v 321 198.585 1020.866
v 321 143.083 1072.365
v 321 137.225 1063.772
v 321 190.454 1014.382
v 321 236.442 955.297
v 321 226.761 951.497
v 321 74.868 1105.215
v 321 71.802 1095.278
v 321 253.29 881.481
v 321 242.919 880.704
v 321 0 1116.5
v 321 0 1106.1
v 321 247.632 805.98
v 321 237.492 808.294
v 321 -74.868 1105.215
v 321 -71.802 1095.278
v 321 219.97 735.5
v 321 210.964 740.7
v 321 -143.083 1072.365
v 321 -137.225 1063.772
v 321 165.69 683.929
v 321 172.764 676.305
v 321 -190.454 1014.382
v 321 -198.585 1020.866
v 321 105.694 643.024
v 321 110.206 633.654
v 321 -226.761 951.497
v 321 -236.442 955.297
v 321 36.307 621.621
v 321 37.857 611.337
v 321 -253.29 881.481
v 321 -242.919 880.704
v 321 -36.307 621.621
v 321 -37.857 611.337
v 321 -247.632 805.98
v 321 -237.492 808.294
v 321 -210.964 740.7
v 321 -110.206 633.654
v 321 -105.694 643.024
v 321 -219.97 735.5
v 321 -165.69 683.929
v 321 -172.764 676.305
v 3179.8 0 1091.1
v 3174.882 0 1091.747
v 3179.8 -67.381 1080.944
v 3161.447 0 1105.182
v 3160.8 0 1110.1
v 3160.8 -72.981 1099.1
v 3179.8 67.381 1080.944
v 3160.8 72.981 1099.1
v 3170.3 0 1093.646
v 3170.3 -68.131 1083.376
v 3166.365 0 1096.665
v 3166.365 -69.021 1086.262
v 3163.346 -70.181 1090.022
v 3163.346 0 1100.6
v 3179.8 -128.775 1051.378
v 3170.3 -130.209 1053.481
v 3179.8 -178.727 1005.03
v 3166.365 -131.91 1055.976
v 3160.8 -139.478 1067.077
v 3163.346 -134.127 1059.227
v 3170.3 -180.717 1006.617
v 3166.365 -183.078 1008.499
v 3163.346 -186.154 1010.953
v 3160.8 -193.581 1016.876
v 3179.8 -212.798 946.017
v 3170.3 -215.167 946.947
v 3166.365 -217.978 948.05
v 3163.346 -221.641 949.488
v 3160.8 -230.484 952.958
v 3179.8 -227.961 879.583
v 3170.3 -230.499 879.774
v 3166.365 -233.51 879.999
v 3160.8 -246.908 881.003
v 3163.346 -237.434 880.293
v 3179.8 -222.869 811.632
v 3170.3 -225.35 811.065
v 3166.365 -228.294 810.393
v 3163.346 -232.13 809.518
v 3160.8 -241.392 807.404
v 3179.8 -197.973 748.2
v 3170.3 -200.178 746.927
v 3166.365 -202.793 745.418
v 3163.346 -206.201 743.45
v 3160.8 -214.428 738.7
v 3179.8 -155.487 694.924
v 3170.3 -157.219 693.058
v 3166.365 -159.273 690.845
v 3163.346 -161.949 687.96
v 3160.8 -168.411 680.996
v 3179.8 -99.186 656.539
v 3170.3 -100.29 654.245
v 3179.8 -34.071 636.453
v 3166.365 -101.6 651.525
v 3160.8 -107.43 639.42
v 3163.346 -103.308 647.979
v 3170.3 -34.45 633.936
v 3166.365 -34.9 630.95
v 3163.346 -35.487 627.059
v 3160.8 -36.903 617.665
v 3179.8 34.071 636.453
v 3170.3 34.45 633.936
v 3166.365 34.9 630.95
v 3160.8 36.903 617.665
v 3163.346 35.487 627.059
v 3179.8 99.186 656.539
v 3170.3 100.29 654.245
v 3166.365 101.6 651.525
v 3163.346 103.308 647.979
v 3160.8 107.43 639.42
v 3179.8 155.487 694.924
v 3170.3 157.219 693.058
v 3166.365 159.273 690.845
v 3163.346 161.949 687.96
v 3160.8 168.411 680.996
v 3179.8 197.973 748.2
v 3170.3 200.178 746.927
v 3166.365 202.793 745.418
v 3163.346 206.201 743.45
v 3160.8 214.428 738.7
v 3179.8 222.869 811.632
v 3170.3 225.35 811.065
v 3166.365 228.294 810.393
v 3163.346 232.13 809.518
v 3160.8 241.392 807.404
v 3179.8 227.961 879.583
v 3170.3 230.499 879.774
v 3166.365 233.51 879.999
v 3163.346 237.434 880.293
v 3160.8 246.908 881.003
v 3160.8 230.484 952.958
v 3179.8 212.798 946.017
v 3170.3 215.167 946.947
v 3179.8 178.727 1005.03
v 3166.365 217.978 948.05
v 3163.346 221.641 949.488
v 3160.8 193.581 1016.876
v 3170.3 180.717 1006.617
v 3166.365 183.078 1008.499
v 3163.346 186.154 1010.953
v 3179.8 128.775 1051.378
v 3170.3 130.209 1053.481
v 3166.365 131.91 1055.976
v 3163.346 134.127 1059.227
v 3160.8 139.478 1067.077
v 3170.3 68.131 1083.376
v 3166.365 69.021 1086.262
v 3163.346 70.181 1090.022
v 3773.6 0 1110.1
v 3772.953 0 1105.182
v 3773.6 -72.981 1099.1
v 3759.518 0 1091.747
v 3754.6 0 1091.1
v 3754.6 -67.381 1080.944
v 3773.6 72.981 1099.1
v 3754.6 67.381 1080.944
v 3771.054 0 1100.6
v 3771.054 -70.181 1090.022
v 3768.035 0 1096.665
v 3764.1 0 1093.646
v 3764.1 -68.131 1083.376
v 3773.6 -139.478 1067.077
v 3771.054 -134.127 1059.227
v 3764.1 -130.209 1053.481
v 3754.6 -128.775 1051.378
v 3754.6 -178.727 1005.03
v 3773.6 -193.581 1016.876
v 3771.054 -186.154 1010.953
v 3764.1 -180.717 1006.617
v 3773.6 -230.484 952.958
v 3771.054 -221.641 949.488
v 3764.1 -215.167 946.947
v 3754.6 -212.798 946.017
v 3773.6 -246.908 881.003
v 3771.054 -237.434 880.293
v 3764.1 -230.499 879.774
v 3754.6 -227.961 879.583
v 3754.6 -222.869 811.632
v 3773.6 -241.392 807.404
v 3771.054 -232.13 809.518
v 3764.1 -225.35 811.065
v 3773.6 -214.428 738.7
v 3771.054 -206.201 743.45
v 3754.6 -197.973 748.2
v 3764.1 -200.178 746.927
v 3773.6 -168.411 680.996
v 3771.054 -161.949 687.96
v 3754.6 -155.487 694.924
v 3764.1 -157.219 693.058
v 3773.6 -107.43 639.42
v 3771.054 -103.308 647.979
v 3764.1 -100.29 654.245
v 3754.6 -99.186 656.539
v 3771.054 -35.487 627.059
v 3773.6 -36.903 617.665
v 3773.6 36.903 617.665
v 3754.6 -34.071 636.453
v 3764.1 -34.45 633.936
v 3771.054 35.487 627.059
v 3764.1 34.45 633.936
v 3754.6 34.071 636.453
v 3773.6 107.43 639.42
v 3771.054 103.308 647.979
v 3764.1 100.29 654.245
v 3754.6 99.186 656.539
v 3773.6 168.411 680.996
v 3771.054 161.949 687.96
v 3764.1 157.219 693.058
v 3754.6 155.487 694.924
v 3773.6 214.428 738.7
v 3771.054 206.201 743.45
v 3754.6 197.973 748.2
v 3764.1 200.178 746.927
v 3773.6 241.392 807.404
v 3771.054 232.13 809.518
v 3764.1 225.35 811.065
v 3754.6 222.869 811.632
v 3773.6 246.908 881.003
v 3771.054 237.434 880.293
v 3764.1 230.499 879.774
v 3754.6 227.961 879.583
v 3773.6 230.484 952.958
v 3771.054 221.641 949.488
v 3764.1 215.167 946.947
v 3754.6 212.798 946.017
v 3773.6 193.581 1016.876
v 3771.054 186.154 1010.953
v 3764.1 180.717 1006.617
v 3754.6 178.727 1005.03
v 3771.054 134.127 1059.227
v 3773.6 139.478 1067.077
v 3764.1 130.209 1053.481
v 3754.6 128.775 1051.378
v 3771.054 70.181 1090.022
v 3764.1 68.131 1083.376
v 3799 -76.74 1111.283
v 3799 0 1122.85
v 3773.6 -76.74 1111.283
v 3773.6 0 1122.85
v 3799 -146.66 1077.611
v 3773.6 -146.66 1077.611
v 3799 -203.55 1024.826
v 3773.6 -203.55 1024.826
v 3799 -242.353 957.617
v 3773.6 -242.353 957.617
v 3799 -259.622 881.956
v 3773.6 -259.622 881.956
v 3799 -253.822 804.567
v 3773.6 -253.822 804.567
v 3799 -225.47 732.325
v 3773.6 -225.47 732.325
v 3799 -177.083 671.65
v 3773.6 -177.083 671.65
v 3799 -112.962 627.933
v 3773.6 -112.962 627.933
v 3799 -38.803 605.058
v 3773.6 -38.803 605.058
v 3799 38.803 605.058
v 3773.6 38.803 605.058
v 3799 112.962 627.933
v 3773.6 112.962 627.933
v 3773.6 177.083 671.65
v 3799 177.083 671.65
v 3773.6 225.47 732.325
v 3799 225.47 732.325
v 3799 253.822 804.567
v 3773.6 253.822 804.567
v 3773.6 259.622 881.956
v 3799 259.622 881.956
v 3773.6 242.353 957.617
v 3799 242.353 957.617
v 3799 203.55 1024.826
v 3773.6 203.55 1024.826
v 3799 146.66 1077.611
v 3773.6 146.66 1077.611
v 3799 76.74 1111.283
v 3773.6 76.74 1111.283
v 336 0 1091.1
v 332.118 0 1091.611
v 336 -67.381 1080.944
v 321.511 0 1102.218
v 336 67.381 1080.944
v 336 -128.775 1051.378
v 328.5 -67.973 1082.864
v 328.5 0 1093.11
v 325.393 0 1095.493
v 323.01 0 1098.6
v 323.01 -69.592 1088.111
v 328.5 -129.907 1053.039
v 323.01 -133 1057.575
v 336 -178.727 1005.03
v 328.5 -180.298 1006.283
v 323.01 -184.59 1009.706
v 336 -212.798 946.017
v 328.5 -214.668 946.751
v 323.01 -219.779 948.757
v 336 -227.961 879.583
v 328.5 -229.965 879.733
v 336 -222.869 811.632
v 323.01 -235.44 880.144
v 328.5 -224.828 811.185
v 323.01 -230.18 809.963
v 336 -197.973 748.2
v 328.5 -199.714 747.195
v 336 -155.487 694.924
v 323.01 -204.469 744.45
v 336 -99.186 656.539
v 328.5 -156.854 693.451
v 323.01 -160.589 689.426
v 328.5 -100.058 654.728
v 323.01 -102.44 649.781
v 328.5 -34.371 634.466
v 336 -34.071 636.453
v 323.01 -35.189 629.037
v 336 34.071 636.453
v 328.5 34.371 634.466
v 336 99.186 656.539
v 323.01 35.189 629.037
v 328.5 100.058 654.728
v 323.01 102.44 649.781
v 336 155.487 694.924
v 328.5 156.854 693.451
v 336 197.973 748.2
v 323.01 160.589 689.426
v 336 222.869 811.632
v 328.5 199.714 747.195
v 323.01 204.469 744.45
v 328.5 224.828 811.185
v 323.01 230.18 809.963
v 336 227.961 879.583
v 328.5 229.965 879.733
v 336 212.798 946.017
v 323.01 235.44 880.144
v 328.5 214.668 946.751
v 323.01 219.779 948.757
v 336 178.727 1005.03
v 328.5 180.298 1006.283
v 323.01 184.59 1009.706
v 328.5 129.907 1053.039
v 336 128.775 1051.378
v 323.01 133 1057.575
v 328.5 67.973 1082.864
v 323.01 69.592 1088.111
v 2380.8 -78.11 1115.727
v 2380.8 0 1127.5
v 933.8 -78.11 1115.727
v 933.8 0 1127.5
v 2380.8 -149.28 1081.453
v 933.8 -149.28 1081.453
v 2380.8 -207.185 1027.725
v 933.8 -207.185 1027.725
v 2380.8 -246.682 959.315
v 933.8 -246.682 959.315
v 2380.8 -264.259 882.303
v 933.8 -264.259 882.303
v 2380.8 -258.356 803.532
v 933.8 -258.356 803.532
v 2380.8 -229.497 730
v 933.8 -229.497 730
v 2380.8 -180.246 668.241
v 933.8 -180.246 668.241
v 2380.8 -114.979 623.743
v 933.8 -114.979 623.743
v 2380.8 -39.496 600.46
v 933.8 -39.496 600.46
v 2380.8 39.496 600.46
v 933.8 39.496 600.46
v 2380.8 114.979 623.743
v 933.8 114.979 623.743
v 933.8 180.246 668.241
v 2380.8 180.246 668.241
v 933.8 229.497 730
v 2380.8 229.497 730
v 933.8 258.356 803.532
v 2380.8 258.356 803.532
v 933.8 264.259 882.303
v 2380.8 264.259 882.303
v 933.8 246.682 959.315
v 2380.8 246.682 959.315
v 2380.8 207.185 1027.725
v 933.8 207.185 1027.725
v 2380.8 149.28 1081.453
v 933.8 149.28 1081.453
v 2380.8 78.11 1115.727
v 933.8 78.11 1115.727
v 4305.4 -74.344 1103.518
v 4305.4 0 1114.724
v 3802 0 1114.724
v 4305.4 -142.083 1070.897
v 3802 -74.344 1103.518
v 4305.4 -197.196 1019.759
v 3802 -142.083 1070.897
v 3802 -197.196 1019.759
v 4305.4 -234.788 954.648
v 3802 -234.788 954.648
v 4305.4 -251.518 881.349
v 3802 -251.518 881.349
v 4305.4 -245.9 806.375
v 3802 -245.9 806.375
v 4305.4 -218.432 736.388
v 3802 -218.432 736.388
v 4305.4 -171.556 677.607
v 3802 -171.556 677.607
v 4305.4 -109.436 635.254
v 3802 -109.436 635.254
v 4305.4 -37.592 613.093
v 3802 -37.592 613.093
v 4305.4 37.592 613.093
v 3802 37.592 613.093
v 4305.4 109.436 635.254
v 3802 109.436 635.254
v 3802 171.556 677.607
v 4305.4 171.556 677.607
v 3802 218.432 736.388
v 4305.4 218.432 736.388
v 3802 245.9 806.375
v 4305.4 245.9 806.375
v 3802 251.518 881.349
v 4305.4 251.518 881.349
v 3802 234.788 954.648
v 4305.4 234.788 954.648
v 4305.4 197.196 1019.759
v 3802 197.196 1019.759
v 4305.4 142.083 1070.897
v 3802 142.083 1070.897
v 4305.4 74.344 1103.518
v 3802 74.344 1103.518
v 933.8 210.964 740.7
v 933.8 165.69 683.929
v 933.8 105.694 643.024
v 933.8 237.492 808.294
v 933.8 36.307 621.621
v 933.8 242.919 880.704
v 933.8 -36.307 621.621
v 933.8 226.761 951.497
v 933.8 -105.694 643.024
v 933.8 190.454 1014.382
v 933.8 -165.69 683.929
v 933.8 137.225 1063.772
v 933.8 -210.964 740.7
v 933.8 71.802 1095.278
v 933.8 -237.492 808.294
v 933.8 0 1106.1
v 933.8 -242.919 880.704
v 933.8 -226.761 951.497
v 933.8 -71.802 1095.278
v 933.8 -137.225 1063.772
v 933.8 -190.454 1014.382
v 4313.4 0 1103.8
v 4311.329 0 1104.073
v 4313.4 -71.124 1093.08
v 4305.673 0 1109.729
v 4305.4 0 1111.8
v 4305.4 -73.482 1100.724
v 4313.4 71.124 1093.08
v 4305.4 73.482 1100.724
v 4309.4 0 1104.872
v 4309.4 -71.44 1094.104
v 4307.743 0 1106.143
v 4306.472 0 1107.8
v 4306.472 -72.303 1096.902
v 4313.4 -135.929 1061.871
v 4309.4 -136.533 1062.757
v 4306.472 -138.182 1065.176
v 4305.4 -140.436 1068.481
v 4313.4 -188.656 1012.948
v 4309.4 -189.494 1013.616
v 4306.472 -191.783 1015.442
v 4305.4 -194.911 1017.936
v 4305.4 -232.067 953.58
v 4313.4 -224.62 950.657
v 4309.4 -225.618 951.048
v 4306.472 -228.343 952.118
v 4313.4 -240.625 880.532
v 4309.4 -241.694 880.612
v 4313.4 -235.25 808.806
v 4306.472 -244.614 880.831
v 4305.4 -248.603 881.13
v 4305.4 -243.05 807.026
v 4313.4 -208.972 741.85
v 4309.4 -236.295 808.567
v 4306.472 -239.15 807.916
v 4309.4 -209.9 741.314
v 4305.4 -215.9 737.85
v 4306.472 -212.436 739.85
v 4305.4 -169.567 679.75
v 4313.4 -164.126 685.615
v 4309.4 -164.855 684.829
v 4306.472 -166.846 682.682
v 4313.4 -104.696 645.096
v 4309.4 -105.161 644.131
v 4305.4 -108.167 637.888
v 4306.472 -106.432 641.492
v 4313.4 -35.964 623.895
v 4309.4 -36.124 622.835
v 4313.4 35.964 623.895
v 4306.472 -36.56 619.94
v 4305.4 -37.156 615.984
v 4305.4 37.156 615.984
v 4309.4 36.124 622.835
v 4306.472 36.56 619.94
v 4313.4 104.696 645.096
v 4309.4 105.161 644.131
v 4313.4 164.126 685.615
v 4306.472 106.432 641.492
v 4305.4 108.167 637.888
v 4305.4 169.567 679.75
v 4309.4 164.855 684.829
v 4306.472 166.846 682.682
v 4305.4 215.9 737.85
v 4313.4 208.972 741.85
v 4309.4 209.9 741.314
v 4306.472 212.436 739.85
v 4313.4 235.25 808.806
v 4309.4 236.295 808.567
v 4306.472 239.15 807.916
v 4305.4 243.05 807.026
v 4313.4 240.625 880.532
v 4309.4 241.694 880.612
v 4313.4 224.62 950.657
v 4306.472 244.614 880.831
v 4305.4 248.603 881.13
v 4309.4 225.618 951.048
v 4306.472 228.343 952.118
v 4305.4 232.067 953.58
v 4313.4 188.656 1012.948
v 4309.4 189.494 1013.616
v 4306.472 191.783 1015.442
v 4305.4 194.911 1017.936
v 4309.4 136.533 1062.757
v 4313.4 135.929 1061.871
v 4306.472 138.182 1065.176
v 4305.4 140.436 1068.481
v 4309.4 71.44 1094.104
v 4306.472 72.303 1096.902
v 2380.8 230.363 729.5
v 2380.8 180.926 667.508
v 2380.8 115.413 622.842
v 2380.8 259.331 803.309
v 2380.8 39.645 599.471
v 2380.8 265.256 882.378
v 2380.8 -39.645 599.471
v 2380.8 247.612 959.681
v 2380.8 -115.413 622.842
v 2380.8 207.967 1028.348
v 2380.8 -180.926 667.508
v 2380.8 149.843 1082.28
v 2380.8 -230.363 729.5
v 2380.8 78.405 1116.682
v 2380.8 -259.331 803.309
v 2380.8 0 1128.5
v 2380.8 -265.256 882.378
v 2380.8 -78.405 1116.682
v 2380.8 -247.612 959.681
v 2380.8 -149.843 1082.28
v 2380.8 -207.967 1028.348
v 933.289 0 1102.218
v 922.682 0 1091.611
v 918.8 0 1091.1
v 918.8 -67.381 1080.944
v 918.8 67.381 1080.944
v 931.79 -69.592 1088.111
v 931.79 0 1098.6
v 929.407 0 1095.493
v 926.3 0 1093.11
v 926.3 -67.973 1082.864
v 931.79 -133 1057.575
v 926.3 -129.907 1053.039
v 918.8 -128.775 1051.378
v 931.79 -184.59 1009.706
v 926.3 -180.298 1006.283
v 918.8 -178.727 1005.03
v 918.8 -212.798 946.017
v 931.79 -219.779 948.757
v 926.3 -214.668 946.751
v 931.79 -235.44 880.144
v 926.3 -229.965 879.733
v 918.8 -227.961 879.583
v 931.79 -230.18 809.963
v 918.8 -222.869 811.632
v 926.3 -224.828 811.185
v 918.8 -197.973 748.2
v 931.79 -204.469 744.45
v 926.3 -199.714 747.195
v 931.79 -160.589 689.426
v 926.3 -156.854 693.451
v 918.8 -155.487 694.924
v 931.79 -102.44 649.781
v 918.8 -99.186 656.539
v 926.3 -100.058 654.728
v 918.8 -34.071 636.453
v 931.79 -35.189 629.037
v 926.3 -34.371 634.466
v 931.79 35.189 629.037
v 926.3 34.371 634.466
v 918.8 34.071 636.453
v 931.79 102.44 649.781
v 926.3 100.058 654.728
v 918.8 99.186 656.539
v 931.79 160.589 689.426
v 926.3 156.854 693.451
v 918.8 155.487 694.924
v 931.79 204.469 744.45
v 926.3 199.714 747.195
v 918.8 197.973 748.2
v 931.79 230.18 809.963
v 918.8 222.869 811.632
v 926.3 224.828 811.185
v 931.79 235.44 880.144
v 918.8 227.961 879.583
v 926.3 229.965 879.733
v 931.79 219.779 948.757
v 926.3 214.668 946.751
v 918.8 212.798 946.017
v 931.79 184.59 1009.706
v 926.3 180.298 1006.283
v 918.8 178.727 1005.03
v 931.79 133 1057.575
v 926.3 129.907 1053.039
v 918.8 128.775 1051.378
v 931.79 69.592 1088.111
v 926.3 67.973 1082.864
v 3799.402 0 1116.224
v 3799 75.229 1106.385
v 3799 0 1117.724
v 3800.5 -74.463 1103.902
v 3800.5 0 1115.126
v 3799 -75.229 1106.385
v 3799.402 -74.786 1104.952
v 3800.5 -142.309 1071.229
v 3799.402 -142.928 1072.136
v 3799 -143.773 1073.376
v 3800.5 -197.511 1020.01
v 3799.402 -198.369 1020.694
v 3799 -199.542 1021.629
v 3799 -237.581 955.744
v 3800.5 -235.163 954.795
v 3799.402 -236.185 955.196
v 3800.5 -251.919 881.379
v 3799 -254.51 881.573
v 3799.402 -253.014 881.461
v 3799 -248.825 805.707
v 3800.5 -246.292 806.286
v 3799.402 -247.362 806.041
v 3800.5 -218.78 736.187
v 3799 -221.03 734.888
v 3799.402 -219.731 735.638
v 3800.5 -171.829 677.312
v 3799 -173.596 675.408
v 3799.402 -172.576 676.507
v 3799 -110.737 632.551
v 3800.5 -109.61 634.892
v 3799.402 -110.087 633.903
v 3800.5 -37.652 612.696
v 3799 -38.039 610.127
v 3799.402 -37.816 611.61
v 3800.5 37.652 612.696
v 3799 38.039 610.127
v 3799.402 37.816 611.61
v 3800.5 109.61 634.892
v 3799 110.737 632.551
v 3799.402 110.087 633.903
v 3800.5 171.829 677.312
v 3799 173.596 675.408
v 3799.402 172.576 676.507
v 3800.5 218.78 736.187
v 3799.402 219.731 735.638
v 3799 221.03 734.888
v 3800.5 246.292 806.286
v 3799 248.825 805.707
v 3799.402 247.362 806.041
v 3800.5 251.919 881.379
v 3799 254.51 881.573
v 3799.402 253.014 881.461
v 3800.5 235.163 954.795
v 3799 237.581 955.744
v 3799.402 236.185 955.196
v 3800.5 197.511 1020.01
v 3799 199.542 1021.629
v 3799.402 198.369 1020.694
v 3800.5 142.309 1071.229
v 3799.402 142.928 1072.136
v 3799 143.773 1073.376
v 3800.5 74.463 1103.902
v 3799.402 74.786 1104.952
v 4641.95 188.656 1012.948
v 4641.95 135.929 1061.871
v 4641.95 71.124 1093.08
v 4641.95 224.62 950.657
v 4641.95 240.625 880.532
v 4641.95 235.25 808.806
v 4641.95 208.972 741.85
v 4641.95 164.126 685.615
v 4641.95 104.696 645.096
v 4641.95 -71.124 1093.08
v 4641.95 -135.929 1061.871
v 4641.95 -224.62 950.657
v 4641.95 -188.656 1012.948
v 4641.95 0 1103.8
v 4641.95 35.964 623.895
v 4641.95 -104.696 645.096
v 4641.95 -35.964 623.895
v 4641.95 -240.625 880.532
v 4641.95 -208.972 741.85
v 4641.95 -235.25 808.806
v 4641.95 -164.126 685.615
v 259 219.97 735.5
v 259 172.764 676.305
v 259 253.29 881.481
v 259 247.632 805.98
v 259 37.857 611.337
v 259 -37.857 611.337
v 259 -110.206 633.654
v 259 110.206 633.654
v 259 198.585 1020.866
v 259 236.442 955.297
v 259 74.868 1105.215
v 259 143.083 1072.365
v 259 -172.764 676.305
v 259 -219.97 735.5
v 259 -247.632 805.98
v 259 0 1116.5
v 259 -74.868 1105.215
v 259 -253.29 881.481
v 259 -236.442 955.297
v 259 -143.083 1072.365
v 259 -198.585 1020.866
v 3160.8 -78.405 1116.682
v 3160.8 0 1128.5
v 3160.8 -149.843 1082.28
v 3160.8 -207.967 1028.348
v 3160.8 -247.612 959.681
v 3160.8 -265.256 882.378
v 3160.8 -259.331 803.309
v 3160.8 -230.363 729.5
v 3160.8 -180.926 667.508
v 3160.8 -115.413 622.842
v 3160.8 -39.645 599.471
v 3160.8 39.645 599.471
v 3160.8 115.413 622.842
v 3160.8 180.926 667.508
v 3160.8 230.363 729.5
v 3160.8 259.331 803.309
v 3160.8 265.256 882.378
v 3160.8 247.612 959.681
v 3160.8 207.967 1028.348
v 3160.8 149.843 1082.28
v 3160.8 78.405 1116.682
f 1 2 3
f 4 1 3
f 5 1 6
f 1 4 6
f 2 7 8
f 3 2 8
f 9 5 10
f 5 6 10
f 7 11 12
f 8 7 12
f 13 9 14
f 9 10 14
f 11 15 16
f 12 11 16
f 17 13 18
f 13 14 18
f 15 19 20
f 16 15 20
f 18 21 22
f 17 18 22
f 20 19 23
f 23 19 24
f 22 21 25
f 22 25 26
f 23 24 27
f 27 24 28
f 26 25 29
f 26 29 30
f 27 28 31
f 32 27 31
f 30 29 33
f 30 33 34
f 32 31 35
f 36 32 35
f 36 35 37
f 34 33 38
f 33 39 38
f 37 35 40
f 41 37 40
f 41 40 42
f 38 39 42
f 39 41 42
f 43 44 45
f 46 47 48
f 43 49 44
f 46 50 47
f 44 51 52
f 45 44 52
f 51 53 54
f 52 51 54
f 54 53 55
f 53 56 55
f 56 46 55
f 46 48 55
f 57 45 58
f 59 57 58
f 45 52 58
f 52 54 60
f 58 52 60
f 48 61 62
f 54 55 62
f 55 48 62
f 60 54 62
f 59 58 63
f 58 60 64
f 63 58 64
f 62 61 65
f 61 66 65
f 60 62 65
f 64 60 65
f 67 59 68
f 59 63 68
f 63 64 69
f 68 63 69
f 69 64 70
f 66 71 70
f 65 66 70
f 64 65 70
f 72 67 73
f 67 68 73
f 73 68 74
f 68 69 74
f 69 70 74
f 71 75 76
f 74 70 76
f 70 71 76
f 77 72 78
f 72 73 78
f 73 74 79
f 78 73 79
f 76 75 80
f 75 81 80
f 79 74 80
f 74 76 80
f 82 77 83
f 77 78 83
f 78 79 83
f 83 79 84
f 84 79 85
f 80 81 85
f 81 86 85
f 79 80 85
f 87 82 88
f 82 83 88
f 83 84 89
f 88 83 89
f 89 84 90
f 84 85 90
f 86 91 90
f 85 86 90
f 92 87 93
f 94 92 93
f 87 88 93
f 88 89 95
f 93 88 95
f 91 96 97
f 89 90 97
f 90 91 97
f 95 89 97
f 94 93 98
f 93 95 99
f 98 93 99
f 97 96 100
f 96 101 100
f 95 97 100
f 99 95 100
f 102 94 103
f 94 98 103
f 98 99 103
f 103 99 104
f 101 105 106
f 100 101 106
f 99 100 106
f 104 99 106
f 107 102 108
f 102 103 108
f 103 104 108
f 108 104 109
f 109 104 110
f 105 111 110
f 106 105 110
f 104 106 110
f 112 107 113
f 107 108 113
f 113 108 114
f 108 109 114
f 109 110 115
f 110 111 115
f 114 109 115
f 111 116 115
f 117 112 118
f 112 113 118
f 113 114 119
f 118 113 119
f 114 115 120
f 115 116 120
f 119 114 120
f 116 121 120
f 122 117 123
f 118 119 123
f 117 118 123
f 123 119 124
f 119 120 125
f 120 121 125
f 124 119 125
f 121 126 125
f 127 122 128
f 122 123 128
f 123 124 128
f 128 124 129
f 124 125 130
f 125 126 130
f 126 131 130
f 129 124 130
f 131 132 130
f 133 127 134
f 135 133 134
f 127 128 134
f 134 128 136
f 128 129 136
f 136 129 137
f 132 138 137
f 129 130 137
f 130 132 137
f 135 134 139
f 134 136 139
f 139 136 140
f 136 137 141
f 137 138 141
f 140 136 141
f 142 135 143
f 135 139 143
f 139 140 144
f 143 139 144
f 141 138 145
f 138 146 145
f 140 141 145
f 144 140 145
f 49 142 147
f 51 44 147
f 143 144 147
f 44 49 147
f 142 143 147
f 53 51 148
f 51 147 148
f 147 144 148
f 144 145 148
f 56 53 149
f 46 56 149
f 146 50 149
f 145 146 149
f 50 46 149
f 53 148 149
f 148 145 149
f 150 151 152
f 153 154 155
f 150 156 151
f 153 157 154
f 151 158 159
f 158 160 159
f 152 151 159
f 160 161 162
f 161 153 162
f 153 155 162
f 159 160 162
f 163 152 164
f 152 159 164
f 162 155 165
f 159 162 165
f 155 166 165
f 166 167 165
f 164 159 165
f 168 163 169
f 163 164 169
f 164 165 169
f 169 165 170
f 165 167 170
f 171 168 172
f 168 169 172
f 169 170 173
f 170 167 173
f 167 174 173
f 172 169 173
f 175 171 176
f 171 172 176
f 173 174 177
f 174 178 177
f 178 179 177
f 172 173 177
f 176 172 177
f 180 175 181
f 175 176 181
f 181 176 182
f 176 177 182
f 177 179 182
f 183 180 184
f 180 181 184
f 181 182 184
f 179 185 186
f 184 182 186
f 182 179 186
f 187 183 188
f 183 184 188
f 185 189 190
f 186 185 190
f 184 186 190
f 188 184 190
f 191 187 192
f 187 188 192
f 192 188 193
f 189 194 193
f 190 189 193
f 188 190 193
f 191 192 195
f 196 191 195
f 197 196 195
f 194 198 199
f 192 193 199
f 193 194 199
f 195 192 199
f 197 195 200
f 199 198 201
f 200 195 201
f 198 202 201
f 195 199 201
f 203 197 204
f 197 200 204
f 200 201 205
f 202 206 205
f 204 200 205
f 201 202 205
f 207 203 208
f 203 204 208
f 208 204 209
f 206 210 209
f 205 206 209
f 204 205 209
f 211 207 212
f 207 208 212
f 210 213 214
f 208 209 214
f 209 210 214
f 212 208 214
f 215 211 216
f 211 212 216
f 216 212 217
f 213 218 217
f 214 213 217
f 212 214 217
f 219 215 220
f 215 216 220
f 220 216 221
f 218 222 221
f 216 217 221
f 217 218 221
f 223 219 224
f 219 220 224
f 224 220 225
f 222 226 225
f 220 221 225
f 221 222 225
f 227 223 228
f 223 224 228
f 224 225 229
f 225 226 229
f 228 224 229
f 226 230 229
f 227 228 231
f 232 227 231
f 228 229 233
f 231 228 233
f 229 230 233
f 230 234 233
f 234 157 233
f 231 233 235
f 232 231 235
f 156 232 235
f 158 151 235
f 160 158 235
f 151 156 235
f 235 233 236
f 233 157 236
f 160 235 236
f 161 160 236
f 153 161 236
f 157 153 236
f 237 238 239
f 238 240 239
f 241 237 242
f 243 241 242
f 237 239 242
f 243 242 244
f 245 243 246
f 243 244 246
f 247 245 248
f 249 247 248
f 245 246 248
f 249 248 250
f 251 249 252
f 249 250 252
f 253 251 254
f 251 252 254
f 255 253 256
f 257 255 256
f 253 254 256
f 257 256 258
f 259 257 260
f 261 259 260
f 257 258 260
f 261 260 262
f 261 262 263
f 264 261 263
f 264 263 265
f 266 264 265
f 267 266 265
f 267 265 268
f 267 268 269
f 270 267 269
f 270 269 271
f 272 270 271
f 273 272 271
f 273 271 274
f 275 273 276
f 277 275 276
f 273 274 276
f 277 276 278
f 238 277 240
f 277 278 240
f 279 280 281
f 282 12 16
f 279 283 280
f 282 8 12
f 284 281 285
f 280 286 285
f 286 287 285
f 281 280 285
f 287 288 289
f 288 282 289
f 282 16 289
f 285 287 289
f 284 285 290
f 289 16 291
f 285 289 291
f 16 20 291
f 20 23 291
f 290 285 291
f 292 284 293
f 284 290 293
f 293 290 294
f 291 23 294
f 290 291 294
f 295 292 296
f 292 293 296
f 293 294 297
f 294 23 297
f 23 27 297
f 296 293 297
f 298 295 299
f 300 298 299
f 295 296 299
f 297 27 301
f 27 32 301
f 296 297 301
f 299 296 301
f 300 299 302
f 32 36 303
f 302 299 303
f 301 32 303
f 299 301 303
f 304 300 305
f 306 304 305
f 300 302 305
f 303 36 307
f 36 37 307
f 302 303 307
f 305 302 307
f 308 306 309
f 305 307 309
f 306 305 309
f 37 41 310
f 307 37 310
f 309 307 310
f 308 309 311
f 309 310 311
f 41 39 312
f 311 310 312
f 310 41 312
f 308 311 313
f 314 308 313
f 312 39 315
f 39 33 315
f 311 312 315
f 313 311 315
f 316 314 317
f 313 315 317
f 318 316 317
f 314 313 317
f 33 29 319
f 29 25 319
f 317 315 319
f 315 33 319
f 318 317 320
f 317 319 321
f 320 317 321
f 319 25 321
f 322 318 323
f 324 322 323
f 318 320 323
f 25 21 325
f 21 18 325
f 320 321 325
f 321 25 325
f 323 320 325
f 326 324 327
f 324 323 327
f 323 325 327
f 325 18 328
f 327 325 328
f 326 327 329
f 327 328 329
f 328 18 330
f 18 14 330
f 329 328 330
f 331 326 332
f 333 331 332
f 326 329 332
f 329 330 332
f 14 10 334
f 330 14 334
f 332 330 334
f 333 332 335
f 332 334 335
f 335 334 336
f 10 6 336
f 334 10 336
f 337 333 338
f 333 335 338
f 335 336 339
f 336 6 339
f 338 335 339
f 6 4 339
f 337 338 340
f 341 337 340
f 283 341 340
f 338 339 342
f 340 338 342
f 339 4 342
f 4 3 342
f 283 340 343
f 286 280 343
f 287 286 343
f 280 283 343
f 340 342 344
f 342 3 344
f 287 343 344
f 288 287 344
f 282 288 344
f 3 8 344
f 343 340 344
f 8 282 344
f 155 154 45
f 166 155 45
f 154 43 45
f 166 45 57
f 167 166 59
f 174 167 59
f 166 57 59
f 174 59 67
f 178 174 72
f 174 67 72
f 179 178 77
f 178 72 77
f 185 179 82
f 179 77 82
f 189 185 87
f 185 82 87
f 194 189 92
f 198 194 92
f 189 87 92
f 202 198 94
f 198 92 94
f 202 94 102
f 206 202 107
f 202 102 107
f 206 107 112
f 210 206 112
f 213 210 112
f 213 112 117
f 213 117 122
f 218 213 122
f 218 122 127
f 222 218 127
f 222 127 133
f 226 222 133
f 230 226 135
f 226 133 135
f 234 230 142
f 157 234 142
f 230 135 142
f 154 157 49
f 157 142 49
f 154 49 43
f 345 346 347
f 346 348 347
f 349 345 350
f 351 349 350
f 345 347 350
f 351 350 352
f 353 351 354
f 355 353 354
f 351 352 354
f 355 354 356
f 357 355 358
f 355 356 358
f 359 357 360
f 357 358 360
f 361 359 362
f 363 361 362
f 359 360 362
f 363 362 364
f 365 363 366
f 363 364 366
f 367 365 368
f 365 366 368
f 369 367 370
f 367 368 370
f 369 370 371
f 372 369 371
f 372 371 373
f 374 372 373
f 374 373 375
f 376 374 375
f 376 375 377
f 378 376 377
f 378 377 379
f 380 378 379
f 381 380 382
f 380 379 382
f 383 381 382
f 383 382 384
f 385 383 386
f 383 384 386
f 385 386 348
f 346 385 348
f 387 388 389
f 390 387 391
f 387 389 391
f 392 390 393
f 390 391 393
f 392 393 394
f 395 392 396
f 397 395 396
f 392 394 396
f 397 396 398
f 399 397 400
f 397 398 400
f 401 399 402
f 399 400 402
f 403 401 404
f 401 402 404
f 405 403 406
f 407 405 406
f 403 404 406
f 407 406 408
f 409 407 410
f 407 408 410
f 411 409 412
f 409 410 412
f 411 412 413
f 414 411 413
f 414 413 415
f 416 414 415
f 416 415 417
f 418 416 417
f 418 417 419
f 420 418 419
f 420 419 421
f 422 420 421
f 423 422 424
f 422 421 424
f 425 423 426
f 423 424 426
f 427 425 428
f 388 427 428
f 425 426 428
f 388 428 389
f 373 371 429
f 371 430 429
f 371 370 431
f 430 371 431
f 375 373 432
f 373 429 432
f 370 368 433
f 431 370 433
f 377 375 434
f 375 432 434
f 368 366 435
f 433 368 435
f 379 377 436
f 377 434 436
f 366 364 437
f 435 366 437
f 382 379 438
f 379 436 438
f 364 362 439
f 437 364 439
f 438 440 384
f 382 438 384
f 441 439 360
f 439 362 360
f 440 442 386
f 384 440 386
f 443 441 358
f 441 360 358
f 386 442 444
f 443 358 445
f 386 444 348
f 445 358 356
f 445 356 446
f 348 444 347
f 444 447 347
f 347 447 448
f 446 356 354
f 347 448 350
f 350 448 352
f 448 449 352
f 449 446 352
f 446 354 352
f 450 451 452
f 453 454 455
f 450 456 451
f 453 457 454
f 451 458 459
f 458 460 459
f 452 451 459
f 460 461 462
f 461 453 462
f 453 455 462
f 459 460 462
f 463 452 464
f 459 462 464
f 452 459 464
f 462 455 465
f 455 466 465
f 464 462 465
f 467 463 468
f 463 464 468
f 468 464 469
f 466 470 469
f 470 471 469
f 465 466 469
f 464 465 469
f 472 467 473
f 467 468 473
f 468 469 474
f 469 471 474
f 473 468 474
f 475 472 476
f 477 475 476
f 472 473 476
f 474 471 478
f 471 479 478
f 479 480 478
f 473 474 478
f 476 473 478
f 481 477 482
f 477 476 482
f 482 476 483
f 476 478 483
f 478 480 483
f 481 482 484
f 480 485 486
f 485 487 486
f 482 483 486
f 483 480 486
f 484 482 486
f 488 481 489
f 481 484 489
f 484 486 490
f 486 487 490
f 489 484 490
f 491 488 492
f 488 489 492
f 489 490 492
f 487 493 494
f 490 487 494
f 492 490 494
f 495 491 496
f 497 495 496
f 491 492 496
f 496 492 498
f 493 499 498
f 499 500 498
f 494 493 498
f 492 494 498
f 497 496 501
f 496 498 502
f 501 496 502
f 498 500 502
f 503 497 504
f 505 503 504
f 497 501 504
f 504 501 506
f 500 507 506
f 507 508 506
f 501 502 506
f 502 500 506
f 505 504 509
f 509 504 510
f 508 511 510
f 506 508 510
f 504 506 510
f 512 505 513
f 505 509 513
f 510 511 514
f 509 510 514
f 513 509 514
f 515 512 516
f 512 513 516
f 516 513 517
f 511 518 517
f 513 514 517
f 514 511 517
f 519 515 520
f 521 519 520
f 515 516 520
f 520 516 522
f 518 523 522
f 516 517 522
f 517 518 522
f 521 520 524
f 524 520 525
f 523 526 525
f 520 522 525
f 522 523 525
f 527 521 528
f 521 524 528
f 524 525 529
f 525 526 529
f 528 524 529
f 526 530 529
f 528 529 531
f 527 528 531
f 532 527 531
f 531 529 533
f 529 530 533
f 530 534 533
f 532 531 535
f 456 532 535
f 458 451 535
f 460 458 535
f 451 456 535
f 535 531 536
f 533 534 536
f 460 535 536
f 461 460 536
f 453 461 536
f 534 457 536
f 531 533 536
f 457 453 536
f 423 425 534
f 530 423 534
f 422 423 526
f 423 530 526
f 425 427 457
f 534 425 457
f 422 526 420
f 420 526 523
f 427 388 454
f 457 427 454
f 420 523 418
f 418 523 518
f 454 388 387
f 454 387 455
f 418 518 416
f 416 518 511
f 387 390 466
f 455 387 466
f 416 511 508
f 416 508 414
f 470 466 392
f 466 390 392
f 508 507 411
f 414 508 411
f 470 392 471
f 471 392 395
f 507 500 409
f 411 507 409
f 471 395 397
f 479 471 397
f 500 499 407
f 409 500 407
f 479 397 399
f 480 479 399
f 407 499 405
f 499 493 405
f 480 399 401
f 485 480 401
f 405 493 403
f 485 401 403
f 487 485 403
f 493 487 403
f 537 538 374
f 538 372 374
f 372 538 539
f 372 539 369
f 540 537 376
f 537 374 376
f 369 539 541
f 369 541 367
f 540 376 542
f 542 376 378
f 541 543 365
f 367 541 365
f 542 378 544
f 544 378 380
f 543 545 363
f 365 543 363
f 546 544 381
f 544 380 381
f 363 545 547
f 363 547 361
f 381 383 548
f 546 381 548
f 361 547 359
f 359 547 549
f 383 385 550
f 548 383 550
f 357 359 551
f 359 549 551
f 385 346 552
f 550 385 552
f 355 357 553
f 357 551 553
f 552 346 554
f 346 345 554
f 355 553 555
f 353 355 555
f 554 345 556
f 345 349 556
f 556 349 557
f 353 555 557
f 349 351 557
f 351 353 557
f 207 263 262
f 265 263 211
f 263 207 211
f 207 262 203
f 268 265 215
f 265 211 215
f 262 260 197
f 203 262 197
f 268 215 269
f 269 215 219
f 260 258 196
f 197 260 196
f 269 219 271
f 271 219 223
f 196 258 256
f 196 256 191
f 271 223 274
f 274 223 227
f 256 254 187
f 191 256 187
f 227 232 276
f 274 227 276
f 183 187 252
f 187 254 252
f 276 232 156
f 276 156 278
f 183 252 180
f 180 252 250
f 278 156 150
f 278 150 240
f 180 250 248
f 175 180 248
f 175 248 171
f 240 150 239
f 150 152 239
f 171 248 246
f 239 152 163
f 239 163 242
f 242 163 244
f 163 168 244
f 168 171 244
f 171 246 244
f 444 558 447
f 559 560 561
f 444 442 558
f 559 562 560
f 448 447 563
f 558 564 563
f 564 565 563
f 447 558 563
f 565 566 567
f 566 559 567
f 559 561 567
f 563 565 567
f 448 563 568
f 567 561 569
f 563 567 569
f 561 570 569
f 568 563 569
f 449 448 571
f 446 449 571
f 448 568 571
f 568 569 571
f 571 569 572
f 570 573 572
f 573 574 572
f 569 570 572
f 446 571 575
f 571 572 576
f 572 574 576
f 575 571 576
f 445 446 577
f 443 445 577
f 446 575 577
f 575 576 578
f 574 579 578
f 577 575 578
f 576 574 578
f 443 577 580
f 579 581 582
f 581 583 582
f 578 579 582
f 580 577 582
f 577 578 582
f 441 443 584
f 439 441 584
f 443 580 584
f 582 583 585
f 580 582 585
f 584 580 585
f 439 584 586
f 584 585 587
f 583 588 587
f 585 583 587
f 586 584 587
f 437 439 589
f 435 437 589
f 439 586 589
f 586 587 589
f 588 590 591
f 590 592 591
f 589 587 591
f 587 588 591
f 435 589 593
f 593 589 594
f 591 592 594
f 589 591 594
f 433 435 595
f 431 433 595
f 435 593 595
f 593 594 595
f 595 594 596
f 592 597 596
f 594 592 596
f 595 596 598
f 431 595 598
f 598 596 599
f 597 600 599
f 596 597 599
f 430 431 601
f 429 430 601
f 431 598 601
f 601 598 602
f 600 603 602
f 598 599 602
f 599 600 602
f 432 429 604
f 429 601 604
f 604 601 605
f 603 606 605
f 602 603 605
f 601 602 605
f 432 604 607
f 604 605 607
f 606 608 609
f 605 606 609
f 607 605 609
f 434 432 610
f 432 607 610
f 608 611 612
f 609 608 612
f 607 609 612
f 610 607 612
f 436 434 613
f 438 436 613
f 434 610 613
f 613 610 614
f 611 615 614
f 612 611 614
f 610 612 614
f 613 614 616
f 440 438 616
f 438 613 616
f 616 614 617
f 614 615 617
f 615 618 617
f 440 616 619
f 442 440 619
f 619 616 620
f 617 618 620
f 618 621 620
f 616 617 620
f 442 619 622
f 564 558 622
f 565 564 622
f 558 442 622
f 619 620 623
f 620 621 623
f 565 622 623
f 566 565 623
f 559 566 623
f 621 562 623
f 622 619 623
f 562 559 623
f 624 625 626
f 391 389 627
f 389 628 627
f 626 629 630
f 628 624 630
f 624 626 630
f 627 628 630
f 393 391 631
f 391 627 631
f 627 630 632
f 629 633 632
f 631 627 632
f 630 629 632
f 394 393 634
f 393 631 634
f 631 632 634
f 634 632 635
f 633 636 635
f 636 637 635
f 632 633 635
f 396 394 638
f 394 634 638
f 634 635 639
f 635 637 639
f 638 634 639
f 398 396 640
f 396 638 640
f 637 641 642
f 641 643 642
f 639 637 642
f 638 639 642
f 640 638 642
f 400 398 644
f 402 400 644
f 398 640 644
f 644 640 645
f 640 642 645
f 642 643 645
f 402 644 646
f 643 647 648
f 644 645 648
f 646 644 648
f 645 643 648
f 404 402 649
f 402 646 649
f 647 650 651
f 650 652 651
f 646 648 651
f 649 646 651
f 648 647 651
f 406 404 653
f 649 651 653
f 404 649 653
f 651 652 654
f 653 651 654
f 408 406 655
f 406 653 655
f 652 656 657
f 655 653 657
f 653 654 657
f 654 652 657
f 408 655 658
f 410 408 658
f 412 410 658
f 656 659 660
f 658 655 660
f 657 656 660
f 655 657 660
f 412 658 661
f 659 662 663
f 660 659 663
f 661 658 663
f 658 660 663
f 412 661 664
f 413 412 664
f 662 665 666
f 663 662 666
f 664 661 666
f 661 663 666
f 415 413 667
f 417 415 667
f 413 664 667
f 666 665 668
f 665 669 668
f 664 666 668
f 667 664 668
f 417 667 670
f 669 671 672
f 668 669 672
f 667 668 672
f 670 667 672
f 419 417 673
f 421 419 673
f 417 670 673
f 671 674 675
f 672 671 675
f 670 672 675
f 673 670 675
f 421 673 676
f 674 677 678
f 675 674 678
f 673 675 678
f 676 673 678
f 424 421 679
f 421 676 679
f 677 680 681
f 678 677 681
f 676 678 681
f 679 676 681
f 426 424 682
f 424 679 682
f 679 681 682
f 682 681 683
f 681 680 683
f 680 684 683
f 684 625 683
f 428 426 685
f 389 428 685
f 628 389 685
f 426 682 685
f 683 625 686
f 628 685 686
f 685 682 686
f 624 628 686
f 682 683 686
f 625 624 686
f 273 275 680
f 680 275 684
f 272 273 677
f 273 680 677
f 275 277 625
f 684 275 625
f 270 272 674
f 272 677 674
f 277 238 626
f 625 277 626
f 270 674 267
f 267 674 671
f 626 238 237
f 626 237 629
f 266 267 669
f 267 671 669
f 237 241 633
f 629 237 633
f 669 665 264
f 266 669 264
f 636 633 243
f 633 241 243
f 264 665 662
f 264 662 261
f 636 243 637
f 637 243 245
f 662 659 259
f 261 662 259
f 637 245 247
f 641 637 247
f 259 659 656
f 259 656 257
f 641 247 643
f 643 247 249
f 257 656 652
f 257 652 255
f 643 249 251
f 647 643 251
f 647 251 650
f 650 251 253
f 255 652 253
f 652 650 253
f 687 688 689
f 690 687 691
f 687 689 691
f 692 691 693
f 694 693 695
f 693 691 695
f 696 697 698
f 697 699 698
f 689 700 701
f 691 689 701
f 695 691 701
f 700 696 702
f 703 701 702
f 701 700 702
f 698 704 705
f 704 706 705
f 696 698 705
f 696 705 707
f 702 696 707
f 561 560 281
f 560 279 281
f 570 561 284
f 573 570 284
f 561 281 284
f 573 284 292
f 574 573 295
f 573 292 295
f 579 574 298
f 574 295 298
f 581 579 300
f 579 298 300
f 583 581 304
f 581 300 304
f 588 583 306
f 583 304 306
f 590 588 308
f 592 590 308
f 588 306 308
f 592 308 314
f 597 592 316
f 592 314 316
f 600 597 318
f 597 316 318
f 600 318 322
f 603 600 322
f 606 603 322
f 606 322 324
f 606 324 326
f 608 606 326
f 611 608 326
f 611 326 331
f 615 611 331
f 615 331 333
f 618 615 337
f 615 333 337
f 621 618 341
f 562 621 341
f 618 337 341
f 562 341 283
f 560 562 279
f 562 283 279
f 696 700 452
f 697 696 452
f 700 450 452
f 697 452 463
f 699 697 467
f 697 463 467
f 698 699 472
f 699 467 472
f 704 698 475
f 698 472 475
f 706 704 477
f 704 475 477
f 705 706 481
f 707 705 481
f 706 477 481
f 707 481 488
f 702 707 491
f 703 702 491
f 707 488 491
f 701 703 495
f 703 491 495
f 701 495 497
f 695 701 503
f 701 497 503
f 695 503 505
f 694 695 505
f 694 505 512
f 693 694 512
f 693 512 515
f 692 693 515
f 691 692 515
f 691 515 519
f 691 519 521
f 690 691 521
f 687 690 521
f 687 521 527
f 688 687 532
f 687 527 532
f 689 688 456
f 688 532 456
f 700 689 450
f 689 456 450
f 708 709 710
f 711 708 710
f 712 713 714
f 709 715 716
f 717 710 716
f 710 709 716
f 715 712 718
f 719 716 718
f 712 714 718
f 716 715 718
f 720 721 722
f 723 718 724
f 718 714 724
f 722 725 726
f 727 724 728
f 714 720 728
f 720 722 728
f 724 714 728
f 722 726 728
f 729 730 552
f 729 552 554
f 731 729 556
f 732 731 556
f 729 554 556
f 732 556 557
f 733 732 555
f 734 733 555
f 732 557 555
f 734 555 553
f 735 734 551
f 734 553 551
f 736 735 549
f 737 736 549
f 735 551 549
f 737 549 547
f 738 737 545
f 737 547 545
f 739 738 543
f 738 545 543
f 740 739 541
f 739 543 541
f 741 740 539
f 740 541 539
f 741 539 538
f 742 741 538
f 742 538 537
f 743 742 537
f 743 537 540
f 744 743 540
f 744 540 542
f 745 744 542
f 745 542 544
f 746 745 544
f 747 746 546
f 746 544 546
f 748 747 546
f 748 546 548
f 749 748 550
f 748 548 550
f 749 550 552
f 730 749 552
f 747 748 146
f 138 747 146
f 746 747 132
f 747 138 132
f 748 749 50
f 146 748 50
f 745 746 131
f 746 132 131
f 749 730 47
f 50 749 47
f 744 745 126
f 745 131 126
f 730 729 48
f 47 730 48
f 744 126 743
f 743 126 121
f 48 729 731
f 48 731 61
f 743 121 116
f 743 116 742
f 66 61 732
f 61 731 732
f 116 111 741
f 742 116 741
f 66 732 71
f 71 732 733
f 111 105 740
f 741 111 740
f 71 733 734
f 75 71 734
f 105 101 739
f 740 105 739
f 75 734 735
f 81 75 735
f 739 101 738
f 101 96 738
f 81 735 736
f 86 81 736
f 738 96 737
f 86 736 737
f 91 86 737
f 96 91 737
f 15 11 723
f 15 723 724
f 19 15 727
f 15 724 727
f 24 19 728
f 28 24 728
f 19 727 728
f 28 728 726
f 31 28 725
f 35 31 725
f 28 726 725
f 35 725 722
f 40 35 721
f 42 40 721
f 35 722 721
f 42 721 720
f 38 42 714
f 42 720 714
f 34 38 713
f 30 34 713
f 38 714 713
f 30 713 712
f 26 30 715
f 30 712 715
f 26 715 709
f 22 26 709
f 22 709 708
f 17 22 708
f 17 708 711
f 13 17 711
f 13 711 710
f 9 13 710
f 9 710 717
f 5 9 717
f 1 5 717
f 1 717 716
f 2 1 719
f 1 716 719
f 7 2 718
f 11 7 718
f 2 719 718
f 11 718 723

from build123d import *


# Not quite as in the source:
# - a feature names something its author has since deleted; it is built from what else it names


with BuildPart() as f1:
    # F0 (on Front) → F1 (revolve)
    with BuildSketch(Plane.XZ):
        Polygon((259, 254), (259, 0), (321, 0), (321, 243.6), (321, 254), align=None)
        Polygon((933.8, 243.6), (933.8, 0), (2380.8, 0), (2380.8, 261), (2380.8, 265), (933.8, 265), align=None)
        Polygon((2380.8, 261), (2380.8, 0), (3160.8, 0), (3160.8, 247.6), (3160.8, 266), (2380.8, 266), (2380.8, 265), align=None)
        with BuildLine():
            Line((3160.8, 247.6), (3160.8, 0))
            Line((3160.8, 0), (3773.6, 0))
            Line((3773.6, 0), (3773.6, 247.6))
            ThreePointArc((3773.6, 247.6), (3768.0350288425, 234.1649711575), (3754.6, 228.6))
            Line((3754.6, 228.6), (3179.8, 228.6))
            ThreePointArc((3179.8, 228.6), (3166.3649711575, 234.1649711575), (3160.8, 247.6))
        make_face()
        with BuildLine():
            Line((3799, 255.2237437367), (3799, 0))
            Line((3799, 0), (4305.4, 0))
            Line((4305.4, 0), (4305.4, 249.3))
            Line((4305.4, 249.3), (4305.4, 252.2237437367))
            Line((4305.4, 252.2237437367), (3802, 252.2237437367))
            ThreePointArc((3802, 252.2237437367), (3799.8786796564, 253.1024233932), (3799, 255.2237437367))
        make_face()
        Polygon((3773.6, 247.6), (3773.6, 0), (3799, 0), (3799, 255.2237437367), (3799, 260.35), (3773.6, 260.35), align=None)
        with BuildLine():
            Line((4305.4, 249.3), (4305.4, 0))
            Line((4305.4, 0), (4641.95, 0))
            Line((4641.95, 0), (4641.95, 241.3))
            Line((4641.95, 241.3), (4313.4, 241.3))
            ThreePointArc((4313.4, 241.3), (4307.7431457505, 243.6431457505), (4305.4, 249.3))
        make_face()
        with BuildLine():
            Line((321, 243.6), (321, 0))
            Line((321, 0), (933.8, 0))
            Line((933.8, 0), (933.8, 243.6))
            ThreePointArc((933.8, 243.6), (929.4066017178, 232.9933982822), (918.8, 228.6))
            Line((918.8, 228.6), (336, 228.6))
            ThreePointArc((336, 228.6), (325.3933982822, 232.9933982822), (321, 243.6))
        make_face()
    revolve(axis=Axis((23207.5, 0, 0), (1, 0, 0)))


with BuildPart() as f1_1:
    # F2: moved
    add(f1.part.moved(Location((0, 0, 862.5))))


solid = f1_1.part
